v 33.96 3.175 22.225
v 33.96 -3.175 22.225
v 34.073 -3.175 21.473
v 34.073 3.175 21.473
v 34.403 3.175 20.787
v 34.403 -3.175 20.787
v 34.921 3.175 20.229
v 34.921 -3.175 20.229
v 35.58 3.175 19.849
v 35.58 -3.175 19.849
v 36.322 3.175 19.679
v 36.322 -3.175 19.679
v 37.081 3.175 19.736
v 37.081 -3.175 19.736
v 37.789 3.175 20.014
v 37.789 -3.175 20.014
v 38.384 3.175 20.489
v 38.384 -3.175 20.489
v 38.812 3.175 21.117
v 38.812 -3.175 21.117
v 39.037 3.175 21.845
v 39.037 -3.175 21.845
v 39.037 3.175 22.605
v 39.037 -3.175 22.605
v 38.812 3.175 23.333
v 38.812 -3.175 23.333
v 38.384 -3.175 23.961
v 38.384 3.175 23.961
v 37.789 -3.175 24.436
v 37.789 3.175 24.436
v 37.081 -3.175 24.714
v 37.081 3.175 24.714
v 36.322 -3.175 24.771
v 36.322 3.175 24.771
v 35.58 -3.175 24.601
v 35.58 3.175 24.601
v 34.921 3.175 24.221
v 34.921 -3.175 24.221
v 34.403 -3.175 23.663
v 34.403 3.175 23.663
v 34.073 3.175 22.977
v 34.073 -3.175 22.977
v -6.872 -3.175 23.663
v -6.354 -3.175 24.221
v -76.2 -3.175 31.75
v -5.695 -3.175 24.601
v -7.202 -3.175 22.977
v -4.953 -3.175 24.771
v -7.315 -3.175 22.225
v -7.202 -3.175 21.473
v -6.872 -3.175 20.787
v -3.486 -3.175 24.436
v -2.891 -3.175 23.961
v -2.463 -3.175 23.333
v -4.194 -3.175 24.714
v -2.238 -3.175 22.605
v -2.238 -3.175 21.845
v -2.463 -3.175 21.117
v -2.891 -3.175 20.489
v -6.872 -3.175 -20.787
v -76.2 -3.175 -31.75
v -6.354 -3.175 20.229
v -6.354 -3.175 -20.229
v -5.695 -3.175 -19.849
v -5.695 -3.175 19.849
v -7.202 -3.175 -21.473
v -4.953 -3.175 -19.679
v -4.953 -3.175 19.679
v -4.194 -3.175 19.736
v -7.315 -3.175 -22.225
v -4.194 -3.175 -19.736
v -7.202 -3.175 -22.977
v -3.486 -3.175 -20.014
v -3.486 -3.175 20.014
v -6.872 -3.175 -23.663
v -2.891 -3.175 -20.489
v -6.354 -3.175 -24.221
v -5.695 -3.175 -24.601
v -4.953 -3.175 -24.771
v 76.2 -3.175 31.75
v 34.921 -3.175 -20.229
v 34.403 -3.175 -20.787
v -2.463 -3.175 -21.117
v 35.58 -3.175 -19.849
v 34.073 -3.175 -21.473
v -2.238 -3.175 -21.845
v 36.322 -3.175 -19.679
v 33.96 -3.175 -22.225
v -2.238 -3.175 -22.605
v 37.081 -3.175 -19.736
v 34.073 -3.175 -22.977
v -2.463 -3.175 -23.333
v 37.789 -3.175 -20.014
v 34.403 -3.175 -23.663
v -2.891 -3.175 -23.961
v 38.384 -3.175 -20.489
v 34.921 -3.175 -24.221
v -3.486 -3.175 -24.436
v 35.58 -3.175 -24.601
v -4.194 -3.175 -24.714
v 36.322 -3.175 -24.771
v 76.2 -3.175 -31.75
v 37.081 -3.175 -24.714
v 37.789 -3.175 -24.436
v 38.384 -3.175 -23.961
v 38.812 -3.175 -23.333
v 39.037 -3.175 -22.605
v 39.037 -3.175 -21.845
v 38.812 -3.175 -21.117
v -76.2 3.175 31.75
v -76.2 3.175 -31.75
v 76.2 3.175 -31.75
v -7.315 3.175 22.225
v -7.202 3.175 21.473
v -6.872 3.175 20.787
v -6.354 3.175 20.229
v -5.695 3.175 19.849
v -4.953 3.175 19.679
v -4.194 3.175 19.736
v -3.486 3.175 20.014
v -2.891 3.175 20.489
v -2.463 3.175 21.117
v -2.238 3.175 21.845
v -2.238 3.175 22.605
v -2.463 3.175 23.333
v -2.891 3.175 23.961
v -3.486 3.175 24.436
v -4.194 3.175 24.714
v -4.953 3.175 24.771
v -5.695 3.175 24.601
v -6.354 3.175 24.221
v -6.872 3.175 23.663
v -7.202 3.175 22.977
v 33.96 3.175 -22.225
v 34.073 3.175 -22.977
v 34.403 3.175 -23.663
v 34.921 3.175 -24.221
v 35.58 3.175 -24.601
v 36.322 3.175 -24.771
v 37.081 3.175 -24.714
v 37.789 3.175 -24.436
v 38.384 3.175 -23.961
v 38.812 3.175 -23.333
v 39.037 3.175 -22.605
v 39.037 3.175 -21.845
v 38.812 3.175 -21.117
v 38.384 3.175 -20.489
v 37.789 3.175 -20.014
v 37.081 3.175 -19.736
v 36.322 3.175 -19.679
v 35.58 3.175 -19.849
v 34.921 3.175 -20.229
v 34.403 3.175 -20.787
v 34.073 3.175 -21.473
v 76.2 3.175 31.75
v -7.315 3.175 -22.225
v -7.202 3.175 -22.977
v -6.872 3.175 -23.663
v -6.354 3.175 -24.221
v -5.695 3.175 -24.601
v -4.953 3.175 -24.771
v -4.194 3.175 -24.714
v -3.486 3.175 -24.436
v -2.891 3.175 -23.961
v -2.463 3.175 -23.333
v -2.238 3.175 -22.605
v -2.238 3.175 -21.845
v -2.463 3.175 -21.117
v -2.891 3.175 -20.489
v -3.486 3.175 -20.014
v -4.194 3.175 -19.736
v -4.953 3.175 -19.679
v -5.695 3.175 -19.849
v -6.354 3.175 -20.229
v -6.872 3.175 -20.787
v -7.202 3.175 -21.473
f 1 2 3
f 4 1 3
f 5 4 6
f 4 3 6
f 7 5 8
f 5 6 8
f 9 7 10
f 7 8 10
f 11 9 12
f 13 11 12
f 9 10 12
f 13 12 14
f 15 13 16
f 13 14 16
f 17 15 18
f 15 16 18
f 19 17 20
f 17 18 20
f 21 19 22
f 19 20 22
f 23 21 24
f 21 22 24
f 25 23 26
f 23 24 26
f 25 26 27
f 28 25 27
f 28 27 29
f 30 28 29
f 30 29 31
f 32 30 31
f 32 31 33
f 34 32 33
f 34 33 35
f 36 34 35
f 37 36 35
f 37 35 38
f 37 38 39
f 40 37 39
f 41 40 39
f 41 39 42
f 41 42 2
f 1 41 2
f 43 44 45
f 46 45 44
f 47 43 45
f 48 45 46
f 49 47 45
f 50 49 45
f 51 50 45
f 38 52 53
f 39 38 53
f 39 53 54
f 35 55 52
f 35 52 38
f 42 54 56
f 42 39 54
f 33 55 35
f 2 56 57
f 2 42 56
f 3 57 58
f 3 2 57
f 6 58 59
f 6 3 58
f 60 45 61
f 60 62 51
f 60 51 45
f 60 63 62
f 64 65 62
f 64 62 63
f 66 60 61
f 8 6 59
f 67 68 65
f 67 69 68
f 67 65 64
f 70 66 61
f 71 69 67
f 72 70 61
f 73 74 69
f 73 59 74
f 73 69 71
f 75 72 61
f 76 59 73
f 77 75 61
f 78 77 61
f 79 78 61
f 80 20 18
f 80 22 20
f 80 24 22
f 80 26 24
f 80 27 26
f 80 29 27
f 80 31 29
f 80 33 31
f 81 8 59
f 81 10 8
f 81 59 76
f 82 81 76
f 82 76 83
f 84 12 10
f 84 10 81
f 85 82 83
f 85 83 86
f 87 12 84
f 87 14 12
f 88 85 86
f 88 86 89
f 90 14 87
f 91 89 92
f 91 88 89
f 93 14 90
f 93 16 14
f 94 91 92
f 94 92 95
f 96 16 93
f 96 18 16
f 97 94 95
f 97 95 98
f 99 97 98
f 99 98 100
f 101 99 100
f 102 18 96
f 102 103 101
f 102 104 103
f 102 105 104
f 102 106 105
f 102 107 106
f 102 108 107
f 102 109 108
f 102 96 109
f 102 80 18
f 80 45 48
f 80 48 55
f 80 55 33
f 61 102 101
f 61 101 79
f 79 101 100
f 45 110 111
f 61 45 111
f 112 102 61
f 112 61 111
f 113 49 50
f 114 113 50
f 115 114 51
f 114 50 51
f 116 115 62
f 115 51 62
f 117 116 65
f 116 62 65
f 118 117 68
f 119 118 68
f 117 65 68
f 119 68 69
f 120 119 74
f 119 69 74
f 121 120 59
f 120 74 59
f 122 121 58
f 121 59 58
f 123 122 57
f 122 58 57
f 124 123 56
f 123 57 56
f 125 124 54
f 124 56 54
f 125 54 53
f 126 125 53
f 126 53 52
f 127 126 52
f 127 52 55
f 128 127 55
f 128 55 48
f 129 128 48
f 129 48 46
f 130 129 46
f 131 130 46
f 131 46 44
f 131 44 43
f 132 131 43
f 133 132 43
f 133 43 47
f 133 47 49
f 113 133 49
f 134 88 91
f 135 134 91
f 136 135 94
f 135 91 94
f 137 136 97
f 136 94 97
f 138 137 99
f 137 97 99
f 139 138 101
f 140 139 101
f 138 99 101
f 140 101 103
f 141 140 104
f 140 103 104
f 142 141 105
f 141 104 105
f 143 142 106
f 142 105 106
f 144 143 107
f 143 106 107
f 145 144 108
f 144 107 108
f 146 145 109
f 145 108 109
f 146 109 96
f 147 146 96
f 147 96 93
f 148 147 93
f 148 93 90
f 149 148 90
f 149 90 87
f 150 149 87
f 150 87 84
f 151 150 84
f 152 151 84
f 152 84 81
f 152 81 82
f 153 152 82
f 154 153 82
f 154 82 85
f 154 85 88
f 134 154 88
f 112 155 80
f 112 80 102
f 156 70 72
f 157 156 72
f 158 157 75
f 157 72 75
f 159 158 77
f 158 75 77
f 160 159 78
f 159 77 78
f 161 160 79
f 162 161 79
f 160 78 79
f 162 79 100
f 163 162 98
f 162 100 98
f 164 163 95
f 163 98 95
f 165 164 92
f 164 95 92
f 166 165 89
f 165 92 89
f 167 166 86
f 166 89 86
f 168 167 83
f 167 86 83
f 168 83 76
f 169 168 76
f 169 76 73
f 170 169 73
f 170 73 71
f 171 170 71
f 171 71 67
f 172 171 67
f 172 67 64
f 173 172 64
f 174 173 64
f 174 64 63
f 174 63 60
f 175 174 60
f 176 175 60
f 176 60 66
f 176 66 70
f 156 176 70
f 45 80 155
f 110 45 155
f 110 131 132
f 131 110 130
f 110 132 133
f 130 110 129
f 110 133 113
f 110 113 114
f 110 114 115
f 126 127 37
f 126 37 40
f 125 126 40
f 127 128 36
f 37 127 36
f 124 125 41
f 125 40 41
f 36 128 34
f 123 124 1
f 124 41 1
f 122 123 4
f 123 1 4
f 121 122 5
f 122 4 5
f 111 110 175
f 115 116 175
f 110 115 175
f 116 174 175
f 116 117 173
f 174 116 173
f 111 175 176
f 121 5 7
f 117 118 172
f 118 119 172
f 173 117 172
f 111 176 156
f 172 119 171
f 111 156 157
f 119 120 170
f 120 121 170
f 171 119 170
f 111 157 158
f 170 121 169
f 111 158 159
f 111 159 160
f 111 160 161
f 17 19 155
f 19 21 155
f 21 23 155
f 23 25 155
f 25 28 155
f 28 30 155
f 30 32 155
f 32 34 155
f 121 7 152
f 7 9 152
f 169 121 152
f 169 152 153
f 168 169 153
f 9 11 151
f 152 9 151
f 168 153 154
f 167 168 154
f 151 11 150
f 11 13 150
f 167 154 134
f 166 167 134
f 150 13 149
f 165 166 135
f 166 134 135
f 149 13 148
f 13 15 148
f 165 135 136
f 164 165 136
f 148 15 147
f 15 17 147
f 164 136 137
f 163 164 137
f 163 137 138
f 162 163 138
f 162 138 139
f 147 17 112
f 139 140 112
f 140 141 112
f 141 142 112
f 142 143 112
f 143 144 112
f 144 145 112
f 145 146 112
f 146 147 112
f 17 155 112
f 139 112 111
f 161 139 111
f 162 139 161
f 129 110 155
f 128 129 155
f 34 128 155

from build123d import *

# Parameters (mm, degrees)
SKETCH1_W                  = 63.5
SKETCH1_H                  = 6.35
BOSS_EXTRUDE1_DEPTH        = 76.2
F_10_CLEARANCE_HOLE1_D     = 5.1054
F_10_CLEARANCE_HOLE1_DEPTH = 9.652
F_10_CLEARANCE_HOLE1_TIP   = 1.533816902


with BuildPart() as part:
    # Sketch1 → Boss-Extrude1 (new, symmetric)
    with BuildSketch(Plane(origin=(0, 0, 0), x_dir=(0, 0, -1), z_dir=(1, 0, 0))):
        Rectangle(SKETCH1_W, SKETCH1_H)
    extrude(amount=BOSS_EXTRUDE1_DEPTH, both=True)

    # #10 Clearance Hole1
    with Locations(Plane(origin=(0, 3.175, 0), x_dir=(1, 0, 0), z_dir=(0, 1, 0))):
        with Locations((-4.7625, 22.225), (36.5125, -22.225), (-4.7625, -22.225), (36.5125, 22.225)):
            Hole(F_10_CLEARANCE_HOLE1_D / 2, depth=F_10_CLEARANCE_HOLE1_DEPTH)
            with Locations((0, 0, -(F_10_CLEARANCE_HOLE1_DEPTH + F_10_CLEARANCE_HOLE1_TIP / 2))):  # 118° drill point
                Cone(0, F_10_CLEARANCE_HOLE1_D / 2, F_10_CLEARANCE_HOLE1_TIP, mode=Mode.SUBTRACT)


solid = part.part
